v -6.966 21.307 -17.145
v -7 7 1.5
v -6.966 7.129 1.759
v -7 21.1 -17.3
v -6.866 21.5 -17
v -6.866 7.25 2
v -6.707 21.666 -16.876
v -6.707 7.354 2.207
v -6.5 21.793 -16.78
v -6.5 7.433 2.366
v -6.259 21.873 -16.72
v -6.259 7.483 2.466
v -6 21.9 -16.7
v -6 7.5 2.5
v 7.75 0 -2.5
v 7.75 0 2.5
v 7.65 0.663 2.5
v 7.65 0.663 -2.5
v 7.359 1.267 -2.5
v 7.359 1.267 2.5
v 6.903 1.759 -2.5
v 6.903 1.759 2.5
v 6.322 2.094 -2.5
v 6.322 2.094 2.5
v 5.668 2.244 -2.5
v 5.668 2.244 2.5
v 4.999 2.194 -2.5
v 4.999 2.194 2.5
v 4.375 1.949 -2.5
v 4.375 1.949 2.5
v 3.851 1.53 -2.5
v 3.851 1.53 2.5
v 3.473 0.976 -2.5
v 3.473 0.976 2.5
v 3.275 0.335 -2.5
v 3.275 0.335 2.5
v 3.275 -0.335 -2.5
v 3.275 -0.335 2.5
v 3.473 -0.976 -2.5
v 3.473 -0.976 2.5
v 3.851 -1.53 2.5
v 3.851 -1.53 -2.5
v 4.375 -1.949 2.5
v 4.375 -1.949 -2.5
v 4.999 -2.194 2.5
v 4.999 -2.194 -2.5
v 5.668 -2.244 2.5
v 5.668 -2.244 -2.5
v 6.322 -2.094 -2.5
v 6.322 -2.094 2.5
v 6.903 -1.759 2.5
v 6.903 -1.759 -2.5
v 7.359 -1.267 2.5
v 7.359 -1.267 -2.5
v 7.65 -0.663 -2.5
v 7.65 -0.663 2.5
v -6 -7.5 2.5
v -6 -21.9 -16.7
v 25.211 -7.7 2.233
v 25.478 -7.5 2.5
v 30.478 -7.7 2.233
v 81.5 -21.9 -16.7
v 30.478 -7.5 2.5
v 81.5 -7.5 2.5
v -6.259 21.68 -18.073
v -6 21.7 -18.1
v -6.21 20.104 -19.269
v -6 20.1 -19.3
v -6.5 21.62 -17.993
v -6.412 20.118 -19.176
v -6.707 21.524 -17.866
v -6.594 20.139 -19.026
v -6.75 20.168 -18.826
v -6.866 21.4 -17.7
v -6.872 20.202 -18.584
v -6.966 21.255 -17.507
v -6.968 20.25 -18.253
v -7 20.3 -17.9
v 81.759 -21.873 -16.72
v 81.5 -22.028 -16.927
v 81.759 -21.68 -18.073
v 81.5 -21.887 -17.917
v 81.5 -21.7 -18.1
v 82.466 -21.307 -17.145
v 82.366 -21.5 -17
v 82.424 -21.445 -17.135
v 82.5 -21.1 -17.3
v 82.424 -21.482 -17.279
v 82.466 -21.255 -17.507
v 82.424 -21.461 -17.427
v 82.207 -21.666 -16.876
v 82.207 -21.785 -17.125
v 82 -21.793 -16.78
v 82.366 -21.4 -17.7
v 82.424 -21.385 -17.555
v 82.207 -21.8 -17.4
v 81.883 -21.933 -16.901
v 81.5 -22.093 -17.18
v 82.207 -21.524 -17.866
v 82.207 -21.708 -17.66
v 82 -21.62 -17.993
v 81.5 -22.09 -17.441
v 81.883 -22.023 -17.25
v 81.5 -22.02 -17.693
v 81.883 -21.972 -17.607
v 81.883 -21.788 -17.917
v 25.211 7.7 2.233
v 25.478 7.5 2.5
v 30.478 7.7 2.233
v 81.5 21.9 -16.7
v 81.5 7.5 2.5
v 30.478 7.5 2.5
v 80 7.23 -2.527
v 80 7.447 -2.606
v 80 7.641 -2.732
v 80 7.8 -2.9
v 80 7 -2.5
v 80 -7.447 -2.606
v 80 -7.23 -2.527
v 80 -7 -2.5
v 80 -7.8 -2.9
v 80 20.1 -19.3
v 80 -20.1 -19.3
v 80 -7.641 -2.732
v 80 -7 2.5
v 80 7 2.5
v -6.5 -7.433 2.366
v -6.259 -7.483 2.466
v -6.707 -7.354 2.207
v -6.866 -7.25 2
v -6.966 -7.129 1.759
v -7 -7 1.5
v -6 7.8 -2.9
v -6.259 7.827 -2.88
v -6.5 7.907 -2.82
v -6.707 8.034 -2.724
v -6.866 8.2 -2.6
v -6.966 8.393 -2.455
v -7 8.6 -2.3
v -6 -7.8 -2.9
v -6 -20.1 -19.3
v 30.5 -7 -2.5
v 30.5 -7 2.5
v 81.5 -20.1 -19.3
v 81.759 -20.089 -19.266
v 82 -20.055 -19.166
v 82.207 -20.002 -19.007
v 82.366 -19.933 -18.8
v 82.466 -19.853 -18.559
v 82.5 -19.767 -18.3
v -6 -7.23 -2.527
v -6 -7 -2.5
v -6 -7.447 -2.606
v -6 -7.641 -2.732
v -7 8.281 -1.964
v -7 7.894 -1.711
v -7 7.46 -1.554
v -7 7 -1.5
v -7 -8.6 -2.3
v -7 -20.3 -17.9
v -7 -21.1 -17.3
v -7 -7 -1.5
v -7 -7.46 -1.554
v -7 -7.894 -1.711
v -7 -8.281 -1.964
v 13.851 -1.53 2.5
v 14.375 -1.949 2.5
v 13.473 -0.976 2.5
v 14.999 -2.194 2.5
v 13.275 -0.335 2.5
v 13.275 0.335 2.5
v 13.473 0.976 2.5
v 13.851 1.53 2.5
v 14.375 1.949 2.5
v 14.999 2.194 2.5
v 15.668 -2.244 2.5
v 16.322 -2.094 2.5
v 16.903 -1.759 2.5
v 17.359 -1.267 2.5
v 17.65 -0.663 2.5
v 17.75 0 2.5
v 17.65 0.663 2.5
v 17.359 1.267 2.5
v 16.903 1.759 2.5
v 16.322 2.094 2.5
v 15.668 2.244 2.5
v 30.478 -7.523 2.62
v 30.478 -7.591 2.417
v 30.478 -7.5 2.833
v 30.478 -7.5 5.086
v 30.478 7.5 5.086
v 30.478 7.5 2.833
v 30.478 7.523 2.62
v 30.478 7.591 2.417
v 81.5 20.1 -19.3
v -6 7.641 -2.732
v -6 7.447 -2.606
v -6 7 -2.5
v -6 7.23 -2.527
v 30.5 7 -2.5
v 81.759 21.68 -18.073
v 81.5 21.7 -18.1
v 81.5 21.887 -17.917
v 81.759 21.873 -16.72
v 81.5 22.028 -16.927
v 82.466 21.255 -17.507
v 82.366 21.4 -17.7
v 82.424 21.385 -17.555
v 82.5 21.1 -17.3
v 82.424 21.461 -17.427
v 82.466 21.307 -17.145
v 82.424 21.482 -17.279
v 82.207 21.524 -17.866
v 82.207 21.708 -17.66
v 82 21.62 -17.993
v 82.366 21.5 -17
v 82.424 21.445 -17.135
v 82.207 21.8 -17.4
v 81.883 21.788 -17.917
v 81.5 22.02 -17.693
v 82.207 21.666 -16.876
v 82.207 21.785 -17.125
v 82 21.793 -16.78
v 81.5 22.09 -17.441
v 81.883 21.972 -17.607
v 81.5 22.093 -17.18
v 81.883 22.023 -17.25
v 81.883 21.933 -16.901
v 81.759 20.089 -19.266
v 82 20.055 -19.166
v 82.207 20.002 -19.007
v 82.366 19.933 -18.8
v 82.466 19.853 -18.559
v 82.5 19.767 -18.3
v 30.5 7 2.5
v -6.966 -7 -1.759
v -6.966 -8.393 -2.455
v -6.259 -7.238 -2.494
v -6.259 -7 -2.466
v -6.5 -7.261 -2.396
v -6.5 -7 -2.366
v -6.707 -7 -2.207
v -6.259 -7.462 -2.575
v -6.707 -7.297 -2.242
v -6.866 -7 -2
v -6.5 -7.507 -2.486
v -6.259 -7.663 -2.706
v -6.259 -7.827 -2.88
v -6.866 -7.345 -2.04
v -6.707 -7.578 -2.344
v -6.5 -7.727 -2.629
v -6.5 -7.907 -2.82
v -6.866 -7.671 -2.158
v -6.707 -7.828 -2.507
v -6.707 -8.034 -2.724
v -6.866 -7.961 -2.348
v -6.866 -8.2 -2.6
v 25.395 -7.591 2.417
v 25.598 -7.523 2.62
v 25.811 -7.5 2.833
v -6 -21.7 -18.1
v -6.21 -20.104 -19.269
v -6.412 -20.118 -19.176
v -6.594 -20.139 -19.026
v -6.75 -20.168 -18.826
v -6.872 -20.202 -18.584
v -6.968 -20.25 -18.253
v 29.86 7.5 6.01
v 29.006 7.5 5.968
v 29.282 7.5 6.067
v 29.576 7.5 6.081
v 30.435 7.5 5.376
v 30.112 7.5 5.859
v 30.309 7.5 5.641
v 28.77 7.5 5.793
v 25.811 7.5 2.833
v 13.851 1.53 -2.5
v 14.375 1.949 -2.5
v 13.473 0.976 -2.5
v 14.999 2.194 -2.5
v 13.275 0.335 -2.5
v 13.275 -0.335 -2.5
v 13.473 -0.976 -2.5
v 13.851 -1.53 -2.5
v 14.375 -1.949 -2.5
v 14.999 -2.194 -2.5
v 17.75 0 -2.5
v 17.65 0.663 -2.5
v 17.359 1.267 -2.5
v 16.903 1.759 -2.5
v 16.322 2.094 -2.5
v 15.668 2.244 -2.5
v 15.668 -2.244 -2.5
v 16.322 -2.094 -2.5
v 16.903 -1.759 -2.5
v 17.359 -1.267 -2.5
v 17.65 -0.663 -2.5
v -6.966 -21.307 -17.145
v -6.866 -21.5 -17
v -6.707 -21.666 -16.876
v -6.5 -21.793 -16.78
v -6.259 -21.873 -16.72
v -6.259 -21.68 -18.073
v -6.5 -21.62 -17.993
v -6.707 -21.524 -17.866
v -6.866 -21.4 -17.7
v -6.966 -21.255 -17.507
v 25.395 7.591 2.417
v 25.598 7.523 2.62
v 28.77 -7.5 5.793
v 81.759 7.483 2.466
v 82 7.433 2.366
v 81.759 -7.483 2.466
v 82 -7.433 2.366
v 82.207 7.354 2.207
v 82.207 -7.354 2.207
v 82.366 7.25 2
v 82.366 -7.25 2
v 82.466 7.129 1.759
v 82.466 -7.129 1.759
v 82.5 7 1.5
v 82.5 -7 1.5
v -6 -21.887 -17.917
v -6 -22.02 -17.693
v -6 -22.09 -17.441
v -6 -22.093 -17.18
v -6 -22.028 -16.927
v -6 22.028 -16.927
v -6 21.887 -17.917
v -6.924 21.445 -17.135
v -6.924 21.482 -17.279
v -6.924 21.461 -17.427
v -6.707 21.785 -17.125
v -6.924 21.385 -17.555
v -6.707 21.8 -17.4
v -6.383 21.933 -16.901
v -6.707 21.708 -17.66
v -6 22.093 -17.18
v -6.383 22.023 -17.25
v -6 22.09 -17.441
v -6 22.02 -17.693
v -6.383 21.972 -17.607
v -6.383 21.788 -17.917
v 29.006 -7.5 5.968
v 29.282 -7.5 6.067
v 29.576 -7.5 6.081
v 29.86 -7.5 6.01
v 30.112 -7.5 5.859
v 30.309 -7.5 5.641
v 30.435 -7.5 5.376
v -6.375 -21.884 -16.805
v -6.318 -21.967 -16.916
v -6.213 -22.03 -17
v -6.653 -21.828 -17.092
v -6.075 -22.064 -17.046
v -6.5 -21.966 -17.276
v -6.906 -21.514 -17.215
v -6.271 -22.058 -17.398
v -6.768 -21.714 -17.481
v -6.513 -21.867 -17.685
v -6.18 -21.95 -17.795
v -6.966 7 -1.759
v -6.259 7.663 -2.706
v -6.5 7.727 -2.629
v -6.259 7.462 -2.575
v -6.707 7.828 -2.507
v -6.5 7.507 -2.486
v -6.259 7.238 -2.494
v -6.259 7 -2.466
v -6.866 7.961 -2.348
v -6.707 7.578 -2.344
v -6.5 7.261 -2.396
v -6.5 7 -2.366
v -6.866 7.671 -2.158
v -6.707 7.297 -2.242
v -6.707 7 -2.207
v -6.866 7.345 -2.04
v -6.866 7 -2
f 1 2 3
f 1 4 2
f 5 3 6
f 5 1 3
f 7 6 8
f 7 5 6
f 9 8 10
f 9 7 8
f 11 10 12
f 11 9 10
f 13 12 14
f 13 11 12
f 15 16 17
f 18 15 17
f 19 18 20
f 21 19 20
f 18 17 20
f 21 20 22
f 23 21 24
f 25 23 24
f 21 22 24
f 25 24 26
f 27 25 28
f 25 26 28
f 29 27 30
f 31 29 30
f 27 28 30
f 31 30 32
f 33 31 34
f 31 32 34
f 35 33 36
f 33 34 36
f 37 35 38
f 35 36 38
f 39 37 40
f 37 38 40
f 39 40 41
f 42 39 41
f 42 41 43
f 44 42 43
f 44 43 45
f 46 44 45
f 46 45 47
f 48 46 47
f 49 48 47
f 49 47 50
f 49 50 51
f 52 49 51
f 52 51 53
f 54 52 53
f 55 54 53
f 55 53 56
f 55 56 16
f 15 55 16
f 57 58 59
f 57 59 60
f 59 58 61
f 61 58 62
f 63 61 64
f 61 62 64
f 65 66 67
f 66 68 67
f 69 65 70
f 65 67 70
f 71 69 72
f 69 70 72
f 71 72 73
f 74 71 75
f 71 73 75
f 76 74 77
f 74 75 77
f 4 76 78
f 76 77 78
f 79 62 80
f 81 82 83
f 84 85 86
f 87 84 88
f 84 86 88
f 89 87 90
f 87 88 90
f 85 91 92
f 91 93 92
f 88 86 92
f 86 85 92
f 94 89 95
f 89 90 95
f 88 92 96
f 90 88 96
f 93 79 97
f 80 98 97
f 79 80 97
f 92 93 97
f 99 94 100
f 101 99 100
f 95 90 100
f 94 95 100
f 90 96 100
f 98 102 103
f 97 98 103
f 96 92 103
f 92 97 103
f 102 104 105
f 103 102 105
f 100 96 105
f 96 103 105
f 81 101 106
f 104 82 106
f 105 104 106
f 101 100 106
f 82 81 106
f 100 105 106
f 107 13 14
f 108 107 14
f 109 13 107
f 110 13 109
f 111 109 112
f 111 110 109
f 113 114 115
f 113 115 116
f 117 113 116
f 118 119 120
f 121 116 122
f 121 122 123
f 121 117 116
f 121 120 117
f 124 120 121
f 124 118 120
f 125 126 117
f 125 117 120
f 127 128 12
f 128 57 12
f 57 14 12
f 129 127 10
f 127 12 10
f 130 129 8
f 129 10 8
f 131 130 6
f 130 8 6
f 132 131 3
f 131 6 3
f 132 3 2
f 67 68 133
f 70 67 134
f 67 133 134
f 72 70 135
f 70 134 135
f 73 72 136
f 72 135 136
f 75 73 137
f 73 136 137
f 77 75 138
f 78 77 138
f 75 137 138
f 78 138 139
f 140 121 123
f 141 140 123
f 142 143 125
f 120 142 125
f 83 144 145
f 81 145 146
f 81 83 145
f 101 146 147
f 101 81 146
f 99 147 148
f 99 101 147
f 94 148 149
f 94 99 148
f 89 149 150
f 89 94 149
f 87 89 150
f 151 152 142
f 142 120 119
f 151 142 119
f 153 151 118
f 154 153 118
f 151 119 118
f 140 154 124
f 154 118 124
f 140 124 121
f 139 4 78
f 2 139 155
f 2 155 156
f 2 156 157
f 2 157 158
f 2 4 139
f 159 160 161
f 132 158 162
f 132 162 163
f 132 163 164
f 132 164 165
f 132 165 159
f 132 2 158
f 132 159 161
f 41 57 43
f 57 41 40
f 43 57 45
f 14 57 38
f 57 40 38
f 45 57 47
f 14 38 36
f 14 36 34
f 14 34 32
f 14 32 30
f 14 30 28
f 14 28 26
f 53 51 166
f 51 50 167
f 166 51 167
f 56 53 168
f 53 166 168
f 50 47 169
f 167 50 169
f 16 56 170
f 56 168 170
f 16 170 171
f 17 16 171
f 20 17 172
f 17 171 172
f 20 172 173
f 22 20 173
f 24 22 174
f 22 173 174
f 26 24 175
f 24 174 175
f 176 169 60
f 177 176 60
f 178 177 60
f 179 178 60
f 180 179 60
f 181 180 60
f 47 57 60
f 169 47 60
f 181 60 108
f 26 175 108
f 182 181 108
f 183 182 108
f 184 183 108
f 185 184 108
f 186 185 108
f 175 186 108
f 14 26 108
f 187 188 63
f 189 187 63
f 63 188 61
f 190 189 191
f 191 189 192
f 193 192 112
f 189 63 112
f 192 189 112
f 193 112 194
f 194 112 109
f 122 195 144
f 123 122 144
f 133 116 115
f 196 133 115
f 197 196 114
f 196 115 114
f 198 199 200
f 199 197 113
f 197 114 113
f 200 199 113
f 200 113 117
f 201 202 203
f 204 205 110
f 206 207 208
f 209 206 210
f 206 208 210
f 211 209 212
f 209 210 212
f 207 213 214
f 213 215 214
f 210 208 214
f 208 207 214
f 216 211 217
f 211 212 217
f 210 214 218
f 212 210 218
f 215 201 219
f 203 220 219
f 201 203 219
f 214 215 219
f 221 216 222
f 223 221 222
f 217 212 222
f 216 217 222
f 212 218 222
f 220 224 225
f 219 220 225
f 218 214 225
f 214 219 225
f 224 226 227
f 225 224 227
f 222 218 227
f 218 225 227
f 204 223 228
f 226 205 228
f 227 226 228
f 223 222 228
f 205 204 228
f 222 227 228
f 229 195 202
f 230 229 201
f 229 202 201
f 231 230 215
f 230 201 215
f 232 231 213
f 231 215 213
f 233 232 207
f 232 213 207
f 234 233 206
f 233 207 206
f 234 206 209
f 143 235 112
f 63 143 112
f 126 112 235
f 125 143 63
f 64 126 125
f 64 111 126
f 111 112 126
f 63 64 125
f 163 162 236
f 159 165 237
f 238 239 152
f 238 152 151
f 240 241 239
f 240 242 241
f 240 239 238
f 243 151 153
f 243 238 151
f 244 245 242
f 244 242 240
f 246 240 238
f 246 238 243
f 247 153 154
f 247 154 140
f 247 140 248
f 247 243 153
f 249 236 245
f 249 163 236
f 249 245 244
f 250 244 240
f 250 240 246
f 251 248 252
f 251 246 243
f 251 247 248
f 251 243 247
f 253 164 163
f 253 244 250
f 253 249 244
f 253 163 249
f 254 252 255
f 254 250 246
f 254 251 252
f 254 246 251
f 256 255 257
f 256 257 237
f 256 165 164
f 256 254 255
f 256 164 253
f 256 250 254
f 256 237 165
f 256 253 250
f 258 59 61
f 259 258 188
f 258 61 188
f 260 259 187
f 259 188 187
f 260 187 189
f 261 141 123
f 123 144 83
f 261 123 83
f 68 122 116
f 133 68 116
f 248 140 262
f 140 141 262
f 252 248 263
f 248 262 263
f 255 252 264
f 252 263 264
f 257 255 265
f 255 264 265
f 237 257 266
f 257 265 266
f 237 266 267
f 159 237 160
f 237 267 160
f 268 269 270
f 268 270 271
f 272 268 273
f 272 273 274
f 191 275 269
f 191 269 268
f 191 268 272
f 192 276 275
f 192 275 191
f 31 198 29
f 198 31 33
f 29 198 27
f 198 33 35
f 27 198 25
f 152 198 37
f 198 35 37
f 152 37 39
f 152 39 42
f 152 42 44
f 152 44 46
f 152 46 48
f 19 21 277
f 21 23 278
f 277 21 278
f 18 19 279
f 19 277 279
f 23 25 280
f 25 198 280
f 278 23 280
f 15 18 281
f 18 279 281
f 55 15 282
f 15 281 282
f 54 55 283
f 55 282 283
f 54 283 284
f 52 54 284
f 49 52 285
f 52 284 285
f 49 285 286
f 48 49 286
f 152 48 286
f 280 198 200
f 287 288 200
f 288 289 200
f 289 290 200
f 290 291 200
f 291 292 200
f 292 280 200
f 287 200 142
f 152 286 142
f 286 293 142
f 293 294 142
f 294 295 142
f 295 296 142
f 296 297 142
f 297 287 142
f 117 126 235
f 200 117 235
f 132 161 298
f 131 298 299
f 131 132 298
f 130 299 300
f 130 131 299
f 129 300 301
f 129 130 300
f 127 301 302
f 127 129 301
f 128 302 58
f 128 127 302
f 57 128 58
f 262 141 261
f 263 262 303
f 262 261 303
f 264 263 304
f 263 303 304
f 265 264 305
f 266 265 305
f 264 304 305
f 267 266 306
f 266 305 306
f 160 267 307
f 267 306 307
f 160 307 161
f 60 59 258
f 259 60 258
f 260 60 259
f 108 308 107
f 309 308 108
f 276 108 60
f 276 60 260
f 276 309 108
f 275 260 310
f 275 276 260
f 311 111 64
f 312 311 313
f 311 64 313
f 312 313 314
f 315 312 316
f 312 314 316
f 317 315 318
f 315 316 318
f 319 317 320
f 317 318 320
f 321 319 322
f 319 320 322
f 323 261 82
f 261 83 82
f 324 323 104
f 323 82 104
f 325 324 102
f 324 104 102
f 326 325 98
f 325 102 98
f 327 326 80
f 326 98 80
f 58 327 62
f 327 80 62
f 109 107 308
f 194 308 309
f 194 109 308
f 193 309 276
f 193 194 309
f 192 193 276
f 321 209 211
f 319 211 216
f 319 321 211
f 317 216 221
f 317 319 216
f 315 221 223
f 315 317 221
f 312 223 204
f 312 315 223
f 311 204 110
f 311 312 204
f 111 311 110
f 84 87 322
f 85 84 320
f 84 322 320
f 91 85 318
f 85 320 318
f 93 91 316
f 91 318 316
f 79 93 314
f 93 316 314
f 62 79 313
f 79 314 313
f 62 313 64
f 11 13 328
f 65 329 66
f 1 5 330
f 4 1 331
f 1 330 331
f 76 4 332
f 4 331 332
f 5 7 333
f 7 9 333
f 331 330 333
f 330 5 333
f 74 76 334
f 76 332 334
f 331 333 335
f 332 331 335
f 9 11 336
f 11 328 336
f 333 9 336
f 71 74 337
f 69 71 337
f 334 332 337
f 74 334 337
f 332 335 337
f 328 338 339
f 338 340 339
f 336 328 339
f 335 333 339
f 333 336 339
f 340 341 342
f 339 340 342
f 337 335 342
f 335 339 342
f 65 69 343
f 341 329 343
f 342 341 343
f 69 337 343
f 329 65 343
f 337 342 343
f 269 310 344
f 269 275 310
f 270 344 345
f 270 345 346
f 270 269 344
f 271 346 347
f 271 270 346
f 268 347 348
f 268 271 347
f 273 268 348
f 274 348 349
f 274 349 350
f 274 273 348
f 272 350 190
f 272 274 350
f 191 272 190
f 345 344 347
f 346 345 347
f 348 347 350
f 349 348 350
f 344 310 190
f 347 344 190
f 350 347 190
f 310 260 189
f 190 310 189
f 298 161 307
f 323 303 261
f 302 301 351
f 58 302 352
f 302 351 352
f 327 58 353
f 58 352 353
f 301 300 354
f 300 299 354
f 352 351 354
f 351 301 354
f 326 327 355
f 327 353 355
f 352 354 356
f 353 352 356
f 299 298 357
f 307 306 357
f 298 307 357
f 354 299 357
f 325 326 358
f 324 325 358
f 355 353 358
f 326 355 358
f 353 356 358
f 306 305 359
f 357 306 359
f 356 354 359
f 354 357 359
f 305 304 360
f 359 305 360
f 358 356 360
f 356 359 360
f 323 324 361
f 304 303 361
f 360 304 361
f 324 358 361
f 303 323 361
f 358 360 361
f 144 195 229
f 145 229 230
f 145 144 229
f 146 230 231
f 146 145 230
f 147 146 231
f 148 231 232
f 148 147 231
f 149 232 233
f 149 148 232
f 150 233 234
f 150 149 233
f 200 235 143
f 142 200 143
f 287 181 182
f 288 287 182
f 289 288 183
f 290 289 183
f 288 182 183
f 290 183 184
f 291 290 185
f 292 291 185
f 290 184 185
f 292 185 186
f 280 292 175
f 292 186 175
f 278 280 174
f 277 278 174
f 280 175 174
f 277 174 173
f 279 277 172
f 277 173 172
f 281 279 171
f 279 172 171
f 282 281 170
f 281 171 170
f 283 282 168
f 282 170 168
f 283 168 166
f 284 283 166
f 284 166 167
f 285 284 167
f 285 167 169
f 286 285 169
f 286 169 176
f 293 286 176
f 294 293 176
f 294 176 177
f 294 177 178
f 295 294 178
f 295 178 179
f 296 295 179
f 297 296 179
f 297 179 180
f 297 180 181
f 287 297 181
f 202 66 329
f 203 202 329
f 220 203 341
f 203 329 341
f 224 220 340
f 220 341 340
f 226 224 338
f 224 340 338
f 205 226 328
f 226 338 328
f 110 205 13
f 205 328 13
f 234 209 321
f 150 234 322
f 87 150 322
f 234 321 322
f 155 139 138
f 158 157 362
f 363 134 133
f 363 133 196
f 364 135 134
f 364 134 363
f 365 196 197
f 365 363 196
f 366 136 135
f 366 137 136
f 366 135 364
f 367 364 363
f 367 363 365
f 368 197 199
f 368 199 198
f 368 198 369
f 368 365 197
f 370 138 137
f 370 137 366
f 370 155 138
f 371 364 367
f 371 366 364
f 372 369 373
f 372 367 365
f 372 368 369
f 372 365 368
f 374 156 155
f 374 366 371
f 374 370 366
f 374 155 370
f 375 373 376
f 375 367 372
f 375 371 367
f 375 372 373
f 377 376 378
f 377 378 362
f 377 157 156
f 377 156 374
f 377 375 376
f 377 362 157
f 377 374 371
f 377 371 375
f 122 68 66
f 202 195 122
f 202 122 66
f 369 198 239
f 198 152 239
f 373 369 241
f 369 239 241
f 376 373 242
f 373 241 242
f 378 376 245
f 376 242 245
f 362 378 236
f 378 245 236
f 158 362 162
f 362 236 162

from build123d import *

# Parameters (mm, degrees)
BOSS_EXTRUDE1_DEPTH = 80
SKETCH2_R           = 2.250000000000002
SKETCH2_R_2         = 2.249999999999999
CUT_EXTRUDE1_DEPTH  = 86.91559811815314
SKETCH3_W           = 8.000000000000007
SKETCH3_H           = 15.000000000000002
BOSS_EXTRUDE2_DEPTH = 5
CHAMFER1_SIZE       = 8
FILLET1_R           = 1
BOSS_EXTRUDE3_DEPTH = 7
BOSS_EXTRUDE4_START = 2.5
BOSS_EXTRUDE4_DEPTH = 2.5
FILLET3_R           = 1


with BuildPart() as part:
    # Sketch1 → Boss-Extrude1 (new body)
    with BuildSketch(Plane.YZ):
        Polygon((-22.5, -17.5), (-7.500000000000001, 2.5000000000000004), (-7.499999999999999, -2.4999999999999996), (-20.099999999999994, -19.300000000000004), align=None)
        Polygon((7.500000000000001, 2.5000000000000004), (7.500000000000001, -2.4999999999999996), (-7.499999999999999, -2.4999999999999996), (-7.500000000000001, 2.5000000000000004), align=None)
        Polygon((7.500000000000001, 2.5000000000000004), (7.500000000000001, -2.4999999999999996), (20.099999999999994, -19.300000000000004), (22.5, -17.5), align=None)
    extrude(amount=BOSS_EXTRUDE1_DEPTH)

    # Sketch2 → Cut-Extrude1 (cut, through all)
    with BuildSketch(Plane.XY.offset(2.5000000000000004)):
        with Locations((5.5, 0)):
            Circle(SKETCH2_R)
        with Locations((15.5, 0)):
            Circle(SKETCH2_R_2)
        Polygon((80, 7.0000000000000036), (30.5, 6.999999999999997), (30.5, -7.000000000000003), (80, -6.9999999999999964), align=None)
    extrude(amount=-CUT_EXTRUDE1_DEPTH, mode=Mode.SUBTRACT)

    # Sketch3 → Boss-Extrude2 (add)
    with BuildSketch(Plane.XY.offset(2.5000000000000004)):
        with Locations((26.47757310370073, 0)):
            Rectangle(SKETCH3_W, SKETCH3_H)
    extrude(amount=BOSS_EXTRUDE2_DEPTH)

    # Chamfer1
    # the kernel refuses this chamfer: 8 mm, written as the material it takes off along each edge
    with BuildSketch(Plane(origin=(22.477573103700728, 28.073463903727287, 7.5), x_dir=(-0.027495876610586494, 0, -0.9996219169112968), z_dir=(0, -1, 0))) as chamfer1_piece_1_section:
        Polygon((CHAMFER1_SIZE * 0.999621916911, CHAMFER1_SIZE * 0.0274958766106), (-CHAMFER1_SIZE * 0.0274958766106, CHAMFER1_SIZE * 0.999621916911), (0, 0), align=None)
    chamfer1_piece_1 = extrude(amount=56.146927807454574, mode=Mode.PRIVATE)
    chamfer1_piece_1 = split(chamfer1_piece_1, bisect_by=Plane(origin=(25.44368954303125, 0, 2.5000000000000004), z_dir=(0, 0, 1)), keep=Keep.TOP, mode=Mode.PRIVATE)
    add(chamfer1_piece_1, mode=Mode.SUBTRACT)

    # Fillet1
    fillet1_edges = [part.edges().sort_by_distance(p)[0] for p in [
        (40, -7.499999999999999, -2.4999999999999996),
        (40, 7.500000000000001, -2.4999999999999996),
        (27.977573103699285, 7.500000000000001, 2.5000000000000004),
        (27.977573103699285, -7.500000000000001, 2.5000000000000004),
        (30.47757310370073, 0, 7.5),
    ]]
    fillet(fillet1_edges, radius=FILLET1_R)

    # Sketch4 → Boss-Extrude3 (add)
    with BuildSketch(Plane(origin=(0, 0, 0), x_dir=(0, -1, 0), z_dir=(-1, 0, 0))):
        with BuildLine():
            Line((22.5, -17.5), (7.500000000000001, 2.5000000000000004))
            Line((7.500000000000001, 2.5000000000000004), (-7.500000000000001, 2.5000000000000004))
            Line((-7.500000000000001, 2.5000000000000004), (-22.5, -17.5))
            Line((-22.5, -17.5), (-20.099999999999994, -19.300000000000004))
            Line((-20.099999999999994, -19.300000000000004), (-7.800000000000002, -2.9000000000000004))
            ThreePointArc((-7.800000000000002, -2.9000000000000004), (-7.447213595499958, -2.6055728090000834), (-6.999999999999999, -2.4999999999999987))
            Line((-6.999999999999999, -2.4999999999999987), (6.999999999999998, -2.4999999999999996))
            ThreePointArc((6.999999999999998, -2.4999999999999996), (7.4472135954999565, -2.6055728090000834), (7.799999999999999, -2.8999999999999995))
            Line((7.799999999999999, -2.8999999999999995), (20.099999999999998, -19.300000000000008))
            Line((20.099999999999998, -19.300000000000008), (22.5, -17.5))
        make_face()
    extrude(amount=BOSS_EXTRUDE3_DEPTH)

    # Sketch6 → Boss-Extrude4 (add)
    with BuildSketch(Plane.YZ.offset(80).offset(BOSS_EXTRUDE4_START)):
        with BuildLine():
            Line((-6.9999999999999964, -2.4999999999999987), (-6.9999999999999964, 2.5000000000000004))
            Line((-6.9999999999999964, 2.5000000000000004), (7.0000000000000036, 2.5000000000000004))
            Line((7.0000000000000036, 2.5000000000000004), (7.0000000000000036, -2.4999999999999996))
            ThreePointArc((7.0000000000000036, -2.4999999999999996), (7.44721359549996, -2.605572809000085), (7.800000000000002, -2.9000000000000004))
            Line((7.800000000000002, -2.9000000000000004), (20.099999999999994, -19.300000000000004))
            Line((20.099999999999994, -19.300000000000004), (-20.099999999999998, -19.300000000000008))
            Line((-20.099999999999998, -19.300000000000008), (-7.799999999999999, -2.8999999999999995))
            ThreePointArc((-7.799999999999999, -2.8999999999999995), (-7.447213595499956, -2.6055728090000825), (-6.9999999999999964, -2.4999999999999987))
        make_face()
        with BuildLine():
            ThreePointArc((-6.9999999999999964, -2.4999999999999987), (-7.447213595499956, -2.6055728090000825), (-7.799999999999999, -2.8999999999999995))
            Line((-7.799999999999999, -2.8999999999999995), (-20.099999999999998, -19.300000000000008))
            Line((-20.099999999999998, -19.300000000000008), (-22.5, -17.5))
            Line((-22.5, -17.5), (-7.500000000000001, 2.5000000000000004))
            Line((-7.500000000000001, 2.5000000000000004), (-6.9999999999999964, 2.5000000000000004))
            Line((-6.9999999999999964, 2.5000000000000004), (-6.9999999999999964, -2.4999999999999987))
        make_face()
        with BuildLine():
            Line((7.500000000000001, 2.5000000000000004), (7.0000000000000036, 2.5000000000000004))
            Line((7.0000000000000036, 2.5000000000000004), (7.0000000000000036, -2.4999999999999996))
            ThreePointArc((7.0000000000000036, -2.4999999999999996), (7.44721359549996, -2.605572809000085), (7.800000000000002, -2.9000000000000004))
            Line((7.800000000000002, -2.9000000000000004), (20.099999999999994, -19.300000000000004))
            Line((20.099999999999994, -19.300000000000004), (22.5, -17.5))
            Line((22.5, -17.5), (7.500000000000001, 2.5000000000000004))
        make_face()
    extrude(amount=-BOSS_EXTRUDE4_DEPTH)

    # Fillet3
    fillet3_edges = [part.edges().sort_by_distance(p)[0] for p in [
        (-7, -21.299999999999997, -18.400000000000002),
        (-7, -15, -7.5),
        (-7, 0, 2.5000000000000004),
        (37.75, 22.5, -17.5),
        (-7, 15, -7.5),
        (-7, 21.299999999999997, -18.400000000000002),
        (-7, 13.949999999999998, -11.100000000000001),
        (-7, 7.447213595499958, -2.605572809000084),
        (-7, 8.9e-16, -2.499999999999999),
        (-7, -7.4472135954999565, -2.6055728090000834),
        (-7, -13.95, -11.100000000000005),
        (37.75, -22.5, -17.5),
        (82.5, 0, 2.5000000000000004),
        (82.5, -15, -7.5),
        (82.5, -21.299999999999997, -18.400000000000002),
        (82.5, 0, -19.300000000000004),
        (82.5, 21.299999999999997, -18.400000000000002),
        (82.5, 15, -7.5),
    ]]
    fillet(fillet3_edges, radius=FILLET3_R)


solid = part.part
